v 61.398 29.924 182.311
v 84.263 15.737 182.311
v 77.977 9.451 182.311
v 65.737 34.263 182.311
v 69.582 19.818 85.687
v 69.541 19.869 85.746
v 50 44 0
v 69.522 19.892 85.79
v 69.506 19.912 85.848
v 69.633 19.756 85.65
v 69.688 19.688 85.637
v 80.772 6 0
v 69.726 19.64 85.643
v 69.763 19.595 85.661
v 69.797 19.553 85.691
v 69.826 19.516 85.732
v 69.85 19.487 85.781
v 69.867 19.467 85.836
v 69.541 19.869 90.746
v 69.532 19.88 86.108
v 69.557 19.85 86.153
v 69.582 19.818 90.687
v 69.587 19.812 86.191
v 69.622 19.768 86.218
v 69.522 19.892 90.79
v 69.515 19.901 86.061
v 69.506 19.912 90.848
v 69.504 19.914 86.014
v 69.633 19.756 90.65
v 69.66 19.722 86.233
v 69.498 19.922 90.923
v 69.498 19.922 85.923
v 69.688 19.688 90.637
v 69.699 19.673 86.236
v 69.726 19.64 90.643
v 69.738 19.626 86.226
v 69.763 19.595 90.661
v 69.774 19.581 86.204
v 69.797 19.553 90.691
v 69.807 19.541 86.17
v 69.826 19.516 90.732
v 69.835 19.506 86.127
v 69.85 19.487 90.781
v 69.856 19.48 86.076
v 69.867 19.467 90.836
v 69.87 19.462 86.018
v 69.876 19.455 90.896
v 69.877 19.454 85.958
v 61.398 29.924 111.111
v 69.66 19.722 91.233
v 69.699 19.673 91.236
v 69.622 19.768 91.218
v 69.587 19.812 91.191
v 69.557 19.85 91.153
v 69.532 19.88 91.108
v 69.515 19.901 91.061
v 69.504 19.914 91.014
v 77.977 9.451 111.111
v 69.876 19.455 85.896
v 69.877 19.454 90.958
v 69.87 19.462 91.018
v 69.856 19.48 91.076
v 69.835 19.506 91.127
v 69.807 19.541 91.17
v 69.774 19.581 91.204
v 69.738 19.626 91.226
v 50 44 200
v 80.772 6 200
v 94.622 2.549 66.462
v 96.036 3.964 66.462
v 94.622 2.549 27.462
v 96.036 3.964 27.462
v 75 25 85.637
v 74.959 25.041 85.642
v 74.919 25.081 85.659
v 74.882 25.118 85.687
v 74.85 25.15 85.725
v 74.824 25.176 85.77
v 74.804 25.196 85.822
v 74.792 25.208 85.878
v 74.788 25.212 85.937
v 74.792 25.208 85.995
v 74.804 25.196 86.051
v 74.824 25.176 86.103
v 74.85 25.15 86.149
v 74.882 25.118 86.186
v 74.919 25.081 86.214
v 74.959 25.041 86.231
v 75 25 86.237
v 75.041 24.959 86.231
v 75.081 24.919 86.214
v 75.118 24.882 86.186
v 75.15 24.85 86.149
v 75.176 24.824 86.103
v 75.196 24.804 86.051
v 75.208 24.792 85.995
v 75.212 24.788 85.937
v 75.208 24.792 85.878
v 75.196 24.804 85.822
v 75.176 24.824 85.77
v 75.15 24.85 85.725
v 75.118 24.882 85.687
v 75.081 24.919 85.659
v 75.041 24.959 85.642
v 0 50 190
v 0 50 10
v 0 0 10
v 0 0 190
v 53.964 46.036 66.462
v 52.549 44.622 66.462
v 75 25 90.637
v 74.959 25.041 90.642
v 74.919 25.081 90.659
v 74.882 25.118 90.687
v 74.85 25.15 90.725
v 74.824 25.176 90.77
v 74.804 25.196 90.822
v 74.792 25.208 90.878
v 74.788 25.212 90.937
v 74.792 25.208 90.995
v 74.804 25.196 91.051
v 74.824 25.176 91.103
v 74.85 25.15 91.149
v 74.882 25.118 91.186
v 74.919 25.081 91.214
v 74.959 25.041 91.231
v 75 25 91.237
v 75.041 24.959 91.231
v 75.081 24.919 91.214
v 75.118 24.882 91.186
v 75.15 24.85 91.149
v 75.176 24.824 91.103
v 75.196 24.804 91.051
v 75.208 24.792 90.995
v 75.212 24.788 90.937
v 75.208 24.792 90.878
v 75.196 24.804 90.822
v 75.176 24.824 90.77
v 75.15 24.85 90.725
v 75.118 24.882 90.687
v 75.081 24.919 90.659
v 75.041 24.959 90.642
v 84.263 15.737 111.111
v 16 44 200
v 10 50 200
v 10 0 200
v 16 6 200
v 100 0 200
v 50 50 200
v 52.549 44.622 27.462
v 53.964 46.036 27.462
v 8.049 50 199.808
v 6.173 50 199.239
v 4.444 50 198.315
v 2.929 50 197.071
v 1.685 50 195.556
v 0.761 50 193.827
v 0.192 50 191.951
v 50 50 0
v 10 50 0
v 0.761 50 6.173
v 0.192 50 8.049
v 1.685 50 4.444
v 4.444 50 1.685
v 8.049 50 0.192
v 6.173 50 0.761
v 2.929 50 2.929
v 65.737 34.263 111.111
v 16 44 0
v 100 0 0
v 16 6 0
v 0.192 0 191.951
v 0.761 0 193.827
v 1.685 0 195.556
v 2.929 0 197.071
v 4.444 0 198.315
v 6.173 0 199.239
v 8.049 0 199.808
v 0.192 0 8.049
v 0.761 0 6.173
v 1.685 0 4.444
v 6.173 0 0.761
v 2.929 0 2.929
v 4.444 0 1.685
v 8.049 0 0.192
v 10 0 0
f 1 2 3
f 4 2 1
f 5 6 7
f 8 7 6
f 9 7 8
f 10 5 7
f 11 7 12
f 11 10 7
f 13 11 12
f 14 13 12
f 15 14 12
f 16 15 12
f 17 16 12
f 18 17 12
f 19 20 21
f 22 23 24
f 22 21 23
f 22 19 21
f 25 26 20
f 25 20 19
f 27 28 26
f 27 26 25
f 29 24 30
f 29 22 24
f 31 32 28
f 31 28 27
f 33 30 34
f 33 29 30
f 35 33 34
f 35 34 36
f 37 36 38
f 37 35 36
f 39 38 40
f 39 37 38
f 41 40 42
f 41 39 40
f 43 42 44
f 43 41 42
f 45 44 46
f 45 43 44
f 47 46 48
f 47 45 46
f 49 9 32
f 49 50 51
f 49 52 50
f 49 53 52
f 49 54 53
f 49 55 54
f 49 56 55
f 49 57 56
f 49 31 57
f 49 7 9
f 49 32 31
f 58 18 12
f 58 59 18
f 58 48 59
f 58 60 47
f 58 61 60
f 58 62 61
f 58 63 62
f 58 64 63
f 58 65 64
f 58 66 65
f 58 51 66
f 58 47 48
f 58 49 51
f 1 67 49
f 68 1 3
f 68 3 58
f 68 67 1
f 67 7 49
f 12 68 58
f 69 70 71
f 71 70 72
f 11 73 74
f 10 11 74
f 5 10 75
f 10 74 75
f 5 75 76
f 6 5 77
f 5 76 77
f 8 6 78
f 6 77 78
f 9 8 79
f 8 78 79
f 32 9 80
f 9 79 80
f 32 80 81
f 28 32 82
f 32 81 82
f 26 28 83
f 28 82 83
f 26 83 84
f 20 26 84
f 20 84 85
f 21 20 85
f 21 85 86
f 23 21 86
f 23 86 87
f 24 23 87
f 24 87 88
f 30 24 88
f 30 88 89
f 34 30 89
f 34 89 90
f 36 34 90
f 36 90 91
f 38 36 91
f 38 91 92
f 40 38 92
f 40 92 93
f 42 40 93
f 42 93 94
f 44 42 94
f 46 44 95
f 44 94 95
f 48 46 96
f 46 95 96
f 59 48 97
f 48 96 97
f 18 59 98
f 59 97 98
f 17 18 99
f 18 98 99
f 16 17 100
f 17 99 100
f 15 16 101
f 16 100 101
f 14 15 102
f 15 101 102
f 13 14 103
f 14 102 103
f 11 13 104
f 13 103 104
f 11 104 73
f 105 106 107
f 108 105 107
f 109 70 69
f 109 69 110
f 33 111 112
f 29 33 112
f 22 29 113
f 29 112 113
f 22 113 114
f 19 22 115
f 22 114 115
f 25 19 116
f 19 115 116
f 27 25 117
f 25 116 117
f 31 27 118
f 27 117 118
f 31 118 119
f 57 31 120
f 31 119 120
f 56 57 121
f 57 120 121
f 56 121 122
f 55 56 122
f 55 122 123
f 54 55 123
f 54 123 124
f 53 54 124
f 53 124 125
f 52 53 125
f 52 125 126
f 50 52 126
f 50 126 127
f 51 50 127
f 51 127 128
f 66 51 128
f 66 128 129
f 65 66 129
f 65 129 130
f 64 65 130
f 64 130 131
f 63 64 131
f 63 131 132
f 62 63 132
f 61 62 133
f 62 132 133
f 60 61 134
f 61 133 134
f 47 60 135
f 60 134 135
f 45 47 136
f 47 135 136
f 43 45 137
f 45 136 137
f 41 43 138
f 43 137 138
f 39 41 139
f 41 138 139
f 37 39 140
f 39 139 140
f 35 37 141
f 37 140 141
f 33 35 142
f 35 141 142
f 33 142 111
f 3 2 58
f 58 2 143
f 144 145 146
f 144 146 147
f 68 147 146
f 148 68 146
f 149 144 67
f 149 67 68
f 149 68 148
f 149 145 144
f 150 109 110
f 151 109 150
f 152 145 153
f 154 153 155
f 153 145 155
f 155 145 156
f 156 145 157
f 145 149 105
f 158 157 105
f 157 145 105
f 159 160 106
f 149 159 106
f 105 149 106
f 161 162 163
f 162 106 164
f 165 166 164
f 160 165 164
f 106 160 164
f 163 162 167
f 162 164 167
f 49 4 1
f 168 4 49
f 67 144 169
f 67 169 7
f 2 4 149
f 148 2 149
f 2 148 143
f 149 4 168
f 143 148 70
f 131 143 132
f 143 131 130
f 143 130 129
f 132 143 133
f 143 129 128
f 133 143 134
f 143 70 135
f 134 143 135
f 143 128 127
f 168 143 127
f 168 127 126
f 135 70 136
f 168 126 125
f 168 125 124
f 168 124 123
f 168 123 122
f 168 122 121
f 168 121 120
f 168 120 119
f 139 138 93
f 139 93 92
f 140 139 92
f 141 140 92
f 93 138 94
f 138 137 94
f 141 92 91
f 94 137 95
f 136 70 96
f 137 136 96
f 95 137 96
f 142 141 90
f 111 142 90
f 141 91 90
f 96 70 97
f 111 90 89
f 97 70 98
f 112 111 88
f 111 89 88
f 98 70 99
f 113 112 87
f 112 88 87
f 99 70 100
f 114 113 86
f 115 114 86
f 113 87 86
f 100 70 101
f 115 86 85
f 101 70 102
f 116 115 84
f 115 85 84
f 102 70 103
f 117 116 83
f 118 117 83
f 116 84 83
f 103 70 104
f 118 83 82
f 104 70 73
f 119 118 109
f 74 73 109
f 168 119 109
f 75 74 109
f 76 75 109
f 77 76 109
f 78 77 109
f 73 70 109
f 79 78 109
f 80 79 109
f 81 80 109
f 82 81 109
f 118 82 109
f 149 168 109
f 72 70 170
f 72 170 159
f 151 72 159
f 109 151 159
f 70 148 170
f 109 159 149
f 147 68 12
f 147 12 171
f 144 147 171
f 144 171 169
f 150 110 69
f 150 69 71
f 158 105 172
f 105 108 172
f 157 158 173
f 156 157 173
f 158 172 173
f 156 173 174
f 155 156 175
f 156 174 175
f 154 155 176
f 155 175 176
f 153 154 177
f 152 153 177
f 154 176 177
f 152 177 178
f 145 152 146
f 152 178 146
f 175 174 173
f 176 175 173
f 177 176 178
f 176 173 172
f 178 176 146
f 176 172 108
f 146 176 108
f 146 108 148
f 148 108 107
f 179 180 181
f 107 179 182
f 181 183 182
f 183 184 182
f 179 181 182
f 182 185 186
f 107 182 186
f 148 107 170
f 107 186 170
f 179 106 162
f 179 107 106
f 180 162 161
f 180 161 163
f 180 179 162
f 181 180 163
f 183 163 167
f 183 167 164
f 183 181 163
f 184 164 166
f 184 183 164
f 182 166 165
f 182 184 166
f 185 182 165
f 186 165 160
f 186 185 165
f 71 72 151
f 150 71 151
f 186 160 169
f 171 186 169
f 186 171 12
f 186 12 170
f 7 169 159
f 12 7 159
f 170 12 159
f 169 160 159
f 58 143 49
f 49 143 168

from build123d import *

# Parameters (mm, degrees)
BOSS_EXTRUDE1_DEPTH = 200
FILLET1_R           = 10
SKETCH2_W           = 39
SKETCH2_H           = 59.5
CUT_EXTRUDE1_DEPTH  = 2
SKETCH3_W           = 71.2
SKETCH3_H           = 26.2
CUT_EXTRUDE2_DEPTH  = 10
CUT_EXTRUDE4_DEPTH  = 215
SKETCH10_R          = 0.3
CUT_EXTRUDE5_DEPTH  = 10


with BuildPart() as part:
    # Sketch1 → Boss-Extrude1 (new body)
    with BuildSketch(Plane.XY):
        Polygon((0, 0), (100, 0), (50, 50), (0, 50), align=None)
    extrude(amount=BOSS_EXTRUDE1_DEPTH)

    # Fillet1
    fillet1_edges = [part.edges().sort_by_distance(p)[0] for p in [
        (0, 25, 200),
        (0, 25, 0),
    ]]
    fillet(fillet1_edges, radius=FILLET1_R)

    # Sketch2 → Cut-Extrude1 (cut)
    with BuildSketch(Plane(origin=(50, 50, 0), x_dir=(0, 0, -1), z_dir=(0.707106781, 0.707106781, 0))):
        with Locations((-46.962285567, -35.355339059)):
            Rectangle(SKETCH2_W, SKETCH2_H)
    extrude(amount=-CUT_EXTRUDE1_DEPTH, mode=Mode.SUBTRACT)

    # Sketch3 → Cut-Extrude2 (cut)
    with BuildSketch(Plane(origin=(50, 50, 0), x_dir=(0, 0, -1), z_dir=(0.707106781, 0.707106781, 0))):
        with Locations((-146.711084233, -35.355339059)):
            Rectangle(SKETCH3_W, SKETCH3_H)
    extrude(amount=-CUT_EXTRUDE2_DEPTH, mode=Mode.SUBTRACT)

    # Sketch6 → Cut-Extrude4 (cut)
    with BuildSketch(Plane.XY.offset(200)):
        Polygon((50, 44), (80.771793261, 6), (16, 6), (16, 44), align=None)
    extrude(amount=-CUT_EXTRUDE4_DEPTH, mode=Mode.SUBTRACT)

    # Sketch10 → Cut-Extrude5 (cut)
    with BuildSketch(Plane(origin=(50, 50, 0), x_dir=(0, 0, -1), z_dir=(0.707106781, 0.707106781, 0))):
        with Locations((-90.936655298, -35.355339059)):
            Circle(SKETCH10_R)
        with Locations((-85.936655298, -35.355339059)):
            Circle(SKETCH10_R)
    extrude(amount=-CUT_EXTRUDE5_DEPTH, mode=Mode.SUBTRACT)


solid = part.part
